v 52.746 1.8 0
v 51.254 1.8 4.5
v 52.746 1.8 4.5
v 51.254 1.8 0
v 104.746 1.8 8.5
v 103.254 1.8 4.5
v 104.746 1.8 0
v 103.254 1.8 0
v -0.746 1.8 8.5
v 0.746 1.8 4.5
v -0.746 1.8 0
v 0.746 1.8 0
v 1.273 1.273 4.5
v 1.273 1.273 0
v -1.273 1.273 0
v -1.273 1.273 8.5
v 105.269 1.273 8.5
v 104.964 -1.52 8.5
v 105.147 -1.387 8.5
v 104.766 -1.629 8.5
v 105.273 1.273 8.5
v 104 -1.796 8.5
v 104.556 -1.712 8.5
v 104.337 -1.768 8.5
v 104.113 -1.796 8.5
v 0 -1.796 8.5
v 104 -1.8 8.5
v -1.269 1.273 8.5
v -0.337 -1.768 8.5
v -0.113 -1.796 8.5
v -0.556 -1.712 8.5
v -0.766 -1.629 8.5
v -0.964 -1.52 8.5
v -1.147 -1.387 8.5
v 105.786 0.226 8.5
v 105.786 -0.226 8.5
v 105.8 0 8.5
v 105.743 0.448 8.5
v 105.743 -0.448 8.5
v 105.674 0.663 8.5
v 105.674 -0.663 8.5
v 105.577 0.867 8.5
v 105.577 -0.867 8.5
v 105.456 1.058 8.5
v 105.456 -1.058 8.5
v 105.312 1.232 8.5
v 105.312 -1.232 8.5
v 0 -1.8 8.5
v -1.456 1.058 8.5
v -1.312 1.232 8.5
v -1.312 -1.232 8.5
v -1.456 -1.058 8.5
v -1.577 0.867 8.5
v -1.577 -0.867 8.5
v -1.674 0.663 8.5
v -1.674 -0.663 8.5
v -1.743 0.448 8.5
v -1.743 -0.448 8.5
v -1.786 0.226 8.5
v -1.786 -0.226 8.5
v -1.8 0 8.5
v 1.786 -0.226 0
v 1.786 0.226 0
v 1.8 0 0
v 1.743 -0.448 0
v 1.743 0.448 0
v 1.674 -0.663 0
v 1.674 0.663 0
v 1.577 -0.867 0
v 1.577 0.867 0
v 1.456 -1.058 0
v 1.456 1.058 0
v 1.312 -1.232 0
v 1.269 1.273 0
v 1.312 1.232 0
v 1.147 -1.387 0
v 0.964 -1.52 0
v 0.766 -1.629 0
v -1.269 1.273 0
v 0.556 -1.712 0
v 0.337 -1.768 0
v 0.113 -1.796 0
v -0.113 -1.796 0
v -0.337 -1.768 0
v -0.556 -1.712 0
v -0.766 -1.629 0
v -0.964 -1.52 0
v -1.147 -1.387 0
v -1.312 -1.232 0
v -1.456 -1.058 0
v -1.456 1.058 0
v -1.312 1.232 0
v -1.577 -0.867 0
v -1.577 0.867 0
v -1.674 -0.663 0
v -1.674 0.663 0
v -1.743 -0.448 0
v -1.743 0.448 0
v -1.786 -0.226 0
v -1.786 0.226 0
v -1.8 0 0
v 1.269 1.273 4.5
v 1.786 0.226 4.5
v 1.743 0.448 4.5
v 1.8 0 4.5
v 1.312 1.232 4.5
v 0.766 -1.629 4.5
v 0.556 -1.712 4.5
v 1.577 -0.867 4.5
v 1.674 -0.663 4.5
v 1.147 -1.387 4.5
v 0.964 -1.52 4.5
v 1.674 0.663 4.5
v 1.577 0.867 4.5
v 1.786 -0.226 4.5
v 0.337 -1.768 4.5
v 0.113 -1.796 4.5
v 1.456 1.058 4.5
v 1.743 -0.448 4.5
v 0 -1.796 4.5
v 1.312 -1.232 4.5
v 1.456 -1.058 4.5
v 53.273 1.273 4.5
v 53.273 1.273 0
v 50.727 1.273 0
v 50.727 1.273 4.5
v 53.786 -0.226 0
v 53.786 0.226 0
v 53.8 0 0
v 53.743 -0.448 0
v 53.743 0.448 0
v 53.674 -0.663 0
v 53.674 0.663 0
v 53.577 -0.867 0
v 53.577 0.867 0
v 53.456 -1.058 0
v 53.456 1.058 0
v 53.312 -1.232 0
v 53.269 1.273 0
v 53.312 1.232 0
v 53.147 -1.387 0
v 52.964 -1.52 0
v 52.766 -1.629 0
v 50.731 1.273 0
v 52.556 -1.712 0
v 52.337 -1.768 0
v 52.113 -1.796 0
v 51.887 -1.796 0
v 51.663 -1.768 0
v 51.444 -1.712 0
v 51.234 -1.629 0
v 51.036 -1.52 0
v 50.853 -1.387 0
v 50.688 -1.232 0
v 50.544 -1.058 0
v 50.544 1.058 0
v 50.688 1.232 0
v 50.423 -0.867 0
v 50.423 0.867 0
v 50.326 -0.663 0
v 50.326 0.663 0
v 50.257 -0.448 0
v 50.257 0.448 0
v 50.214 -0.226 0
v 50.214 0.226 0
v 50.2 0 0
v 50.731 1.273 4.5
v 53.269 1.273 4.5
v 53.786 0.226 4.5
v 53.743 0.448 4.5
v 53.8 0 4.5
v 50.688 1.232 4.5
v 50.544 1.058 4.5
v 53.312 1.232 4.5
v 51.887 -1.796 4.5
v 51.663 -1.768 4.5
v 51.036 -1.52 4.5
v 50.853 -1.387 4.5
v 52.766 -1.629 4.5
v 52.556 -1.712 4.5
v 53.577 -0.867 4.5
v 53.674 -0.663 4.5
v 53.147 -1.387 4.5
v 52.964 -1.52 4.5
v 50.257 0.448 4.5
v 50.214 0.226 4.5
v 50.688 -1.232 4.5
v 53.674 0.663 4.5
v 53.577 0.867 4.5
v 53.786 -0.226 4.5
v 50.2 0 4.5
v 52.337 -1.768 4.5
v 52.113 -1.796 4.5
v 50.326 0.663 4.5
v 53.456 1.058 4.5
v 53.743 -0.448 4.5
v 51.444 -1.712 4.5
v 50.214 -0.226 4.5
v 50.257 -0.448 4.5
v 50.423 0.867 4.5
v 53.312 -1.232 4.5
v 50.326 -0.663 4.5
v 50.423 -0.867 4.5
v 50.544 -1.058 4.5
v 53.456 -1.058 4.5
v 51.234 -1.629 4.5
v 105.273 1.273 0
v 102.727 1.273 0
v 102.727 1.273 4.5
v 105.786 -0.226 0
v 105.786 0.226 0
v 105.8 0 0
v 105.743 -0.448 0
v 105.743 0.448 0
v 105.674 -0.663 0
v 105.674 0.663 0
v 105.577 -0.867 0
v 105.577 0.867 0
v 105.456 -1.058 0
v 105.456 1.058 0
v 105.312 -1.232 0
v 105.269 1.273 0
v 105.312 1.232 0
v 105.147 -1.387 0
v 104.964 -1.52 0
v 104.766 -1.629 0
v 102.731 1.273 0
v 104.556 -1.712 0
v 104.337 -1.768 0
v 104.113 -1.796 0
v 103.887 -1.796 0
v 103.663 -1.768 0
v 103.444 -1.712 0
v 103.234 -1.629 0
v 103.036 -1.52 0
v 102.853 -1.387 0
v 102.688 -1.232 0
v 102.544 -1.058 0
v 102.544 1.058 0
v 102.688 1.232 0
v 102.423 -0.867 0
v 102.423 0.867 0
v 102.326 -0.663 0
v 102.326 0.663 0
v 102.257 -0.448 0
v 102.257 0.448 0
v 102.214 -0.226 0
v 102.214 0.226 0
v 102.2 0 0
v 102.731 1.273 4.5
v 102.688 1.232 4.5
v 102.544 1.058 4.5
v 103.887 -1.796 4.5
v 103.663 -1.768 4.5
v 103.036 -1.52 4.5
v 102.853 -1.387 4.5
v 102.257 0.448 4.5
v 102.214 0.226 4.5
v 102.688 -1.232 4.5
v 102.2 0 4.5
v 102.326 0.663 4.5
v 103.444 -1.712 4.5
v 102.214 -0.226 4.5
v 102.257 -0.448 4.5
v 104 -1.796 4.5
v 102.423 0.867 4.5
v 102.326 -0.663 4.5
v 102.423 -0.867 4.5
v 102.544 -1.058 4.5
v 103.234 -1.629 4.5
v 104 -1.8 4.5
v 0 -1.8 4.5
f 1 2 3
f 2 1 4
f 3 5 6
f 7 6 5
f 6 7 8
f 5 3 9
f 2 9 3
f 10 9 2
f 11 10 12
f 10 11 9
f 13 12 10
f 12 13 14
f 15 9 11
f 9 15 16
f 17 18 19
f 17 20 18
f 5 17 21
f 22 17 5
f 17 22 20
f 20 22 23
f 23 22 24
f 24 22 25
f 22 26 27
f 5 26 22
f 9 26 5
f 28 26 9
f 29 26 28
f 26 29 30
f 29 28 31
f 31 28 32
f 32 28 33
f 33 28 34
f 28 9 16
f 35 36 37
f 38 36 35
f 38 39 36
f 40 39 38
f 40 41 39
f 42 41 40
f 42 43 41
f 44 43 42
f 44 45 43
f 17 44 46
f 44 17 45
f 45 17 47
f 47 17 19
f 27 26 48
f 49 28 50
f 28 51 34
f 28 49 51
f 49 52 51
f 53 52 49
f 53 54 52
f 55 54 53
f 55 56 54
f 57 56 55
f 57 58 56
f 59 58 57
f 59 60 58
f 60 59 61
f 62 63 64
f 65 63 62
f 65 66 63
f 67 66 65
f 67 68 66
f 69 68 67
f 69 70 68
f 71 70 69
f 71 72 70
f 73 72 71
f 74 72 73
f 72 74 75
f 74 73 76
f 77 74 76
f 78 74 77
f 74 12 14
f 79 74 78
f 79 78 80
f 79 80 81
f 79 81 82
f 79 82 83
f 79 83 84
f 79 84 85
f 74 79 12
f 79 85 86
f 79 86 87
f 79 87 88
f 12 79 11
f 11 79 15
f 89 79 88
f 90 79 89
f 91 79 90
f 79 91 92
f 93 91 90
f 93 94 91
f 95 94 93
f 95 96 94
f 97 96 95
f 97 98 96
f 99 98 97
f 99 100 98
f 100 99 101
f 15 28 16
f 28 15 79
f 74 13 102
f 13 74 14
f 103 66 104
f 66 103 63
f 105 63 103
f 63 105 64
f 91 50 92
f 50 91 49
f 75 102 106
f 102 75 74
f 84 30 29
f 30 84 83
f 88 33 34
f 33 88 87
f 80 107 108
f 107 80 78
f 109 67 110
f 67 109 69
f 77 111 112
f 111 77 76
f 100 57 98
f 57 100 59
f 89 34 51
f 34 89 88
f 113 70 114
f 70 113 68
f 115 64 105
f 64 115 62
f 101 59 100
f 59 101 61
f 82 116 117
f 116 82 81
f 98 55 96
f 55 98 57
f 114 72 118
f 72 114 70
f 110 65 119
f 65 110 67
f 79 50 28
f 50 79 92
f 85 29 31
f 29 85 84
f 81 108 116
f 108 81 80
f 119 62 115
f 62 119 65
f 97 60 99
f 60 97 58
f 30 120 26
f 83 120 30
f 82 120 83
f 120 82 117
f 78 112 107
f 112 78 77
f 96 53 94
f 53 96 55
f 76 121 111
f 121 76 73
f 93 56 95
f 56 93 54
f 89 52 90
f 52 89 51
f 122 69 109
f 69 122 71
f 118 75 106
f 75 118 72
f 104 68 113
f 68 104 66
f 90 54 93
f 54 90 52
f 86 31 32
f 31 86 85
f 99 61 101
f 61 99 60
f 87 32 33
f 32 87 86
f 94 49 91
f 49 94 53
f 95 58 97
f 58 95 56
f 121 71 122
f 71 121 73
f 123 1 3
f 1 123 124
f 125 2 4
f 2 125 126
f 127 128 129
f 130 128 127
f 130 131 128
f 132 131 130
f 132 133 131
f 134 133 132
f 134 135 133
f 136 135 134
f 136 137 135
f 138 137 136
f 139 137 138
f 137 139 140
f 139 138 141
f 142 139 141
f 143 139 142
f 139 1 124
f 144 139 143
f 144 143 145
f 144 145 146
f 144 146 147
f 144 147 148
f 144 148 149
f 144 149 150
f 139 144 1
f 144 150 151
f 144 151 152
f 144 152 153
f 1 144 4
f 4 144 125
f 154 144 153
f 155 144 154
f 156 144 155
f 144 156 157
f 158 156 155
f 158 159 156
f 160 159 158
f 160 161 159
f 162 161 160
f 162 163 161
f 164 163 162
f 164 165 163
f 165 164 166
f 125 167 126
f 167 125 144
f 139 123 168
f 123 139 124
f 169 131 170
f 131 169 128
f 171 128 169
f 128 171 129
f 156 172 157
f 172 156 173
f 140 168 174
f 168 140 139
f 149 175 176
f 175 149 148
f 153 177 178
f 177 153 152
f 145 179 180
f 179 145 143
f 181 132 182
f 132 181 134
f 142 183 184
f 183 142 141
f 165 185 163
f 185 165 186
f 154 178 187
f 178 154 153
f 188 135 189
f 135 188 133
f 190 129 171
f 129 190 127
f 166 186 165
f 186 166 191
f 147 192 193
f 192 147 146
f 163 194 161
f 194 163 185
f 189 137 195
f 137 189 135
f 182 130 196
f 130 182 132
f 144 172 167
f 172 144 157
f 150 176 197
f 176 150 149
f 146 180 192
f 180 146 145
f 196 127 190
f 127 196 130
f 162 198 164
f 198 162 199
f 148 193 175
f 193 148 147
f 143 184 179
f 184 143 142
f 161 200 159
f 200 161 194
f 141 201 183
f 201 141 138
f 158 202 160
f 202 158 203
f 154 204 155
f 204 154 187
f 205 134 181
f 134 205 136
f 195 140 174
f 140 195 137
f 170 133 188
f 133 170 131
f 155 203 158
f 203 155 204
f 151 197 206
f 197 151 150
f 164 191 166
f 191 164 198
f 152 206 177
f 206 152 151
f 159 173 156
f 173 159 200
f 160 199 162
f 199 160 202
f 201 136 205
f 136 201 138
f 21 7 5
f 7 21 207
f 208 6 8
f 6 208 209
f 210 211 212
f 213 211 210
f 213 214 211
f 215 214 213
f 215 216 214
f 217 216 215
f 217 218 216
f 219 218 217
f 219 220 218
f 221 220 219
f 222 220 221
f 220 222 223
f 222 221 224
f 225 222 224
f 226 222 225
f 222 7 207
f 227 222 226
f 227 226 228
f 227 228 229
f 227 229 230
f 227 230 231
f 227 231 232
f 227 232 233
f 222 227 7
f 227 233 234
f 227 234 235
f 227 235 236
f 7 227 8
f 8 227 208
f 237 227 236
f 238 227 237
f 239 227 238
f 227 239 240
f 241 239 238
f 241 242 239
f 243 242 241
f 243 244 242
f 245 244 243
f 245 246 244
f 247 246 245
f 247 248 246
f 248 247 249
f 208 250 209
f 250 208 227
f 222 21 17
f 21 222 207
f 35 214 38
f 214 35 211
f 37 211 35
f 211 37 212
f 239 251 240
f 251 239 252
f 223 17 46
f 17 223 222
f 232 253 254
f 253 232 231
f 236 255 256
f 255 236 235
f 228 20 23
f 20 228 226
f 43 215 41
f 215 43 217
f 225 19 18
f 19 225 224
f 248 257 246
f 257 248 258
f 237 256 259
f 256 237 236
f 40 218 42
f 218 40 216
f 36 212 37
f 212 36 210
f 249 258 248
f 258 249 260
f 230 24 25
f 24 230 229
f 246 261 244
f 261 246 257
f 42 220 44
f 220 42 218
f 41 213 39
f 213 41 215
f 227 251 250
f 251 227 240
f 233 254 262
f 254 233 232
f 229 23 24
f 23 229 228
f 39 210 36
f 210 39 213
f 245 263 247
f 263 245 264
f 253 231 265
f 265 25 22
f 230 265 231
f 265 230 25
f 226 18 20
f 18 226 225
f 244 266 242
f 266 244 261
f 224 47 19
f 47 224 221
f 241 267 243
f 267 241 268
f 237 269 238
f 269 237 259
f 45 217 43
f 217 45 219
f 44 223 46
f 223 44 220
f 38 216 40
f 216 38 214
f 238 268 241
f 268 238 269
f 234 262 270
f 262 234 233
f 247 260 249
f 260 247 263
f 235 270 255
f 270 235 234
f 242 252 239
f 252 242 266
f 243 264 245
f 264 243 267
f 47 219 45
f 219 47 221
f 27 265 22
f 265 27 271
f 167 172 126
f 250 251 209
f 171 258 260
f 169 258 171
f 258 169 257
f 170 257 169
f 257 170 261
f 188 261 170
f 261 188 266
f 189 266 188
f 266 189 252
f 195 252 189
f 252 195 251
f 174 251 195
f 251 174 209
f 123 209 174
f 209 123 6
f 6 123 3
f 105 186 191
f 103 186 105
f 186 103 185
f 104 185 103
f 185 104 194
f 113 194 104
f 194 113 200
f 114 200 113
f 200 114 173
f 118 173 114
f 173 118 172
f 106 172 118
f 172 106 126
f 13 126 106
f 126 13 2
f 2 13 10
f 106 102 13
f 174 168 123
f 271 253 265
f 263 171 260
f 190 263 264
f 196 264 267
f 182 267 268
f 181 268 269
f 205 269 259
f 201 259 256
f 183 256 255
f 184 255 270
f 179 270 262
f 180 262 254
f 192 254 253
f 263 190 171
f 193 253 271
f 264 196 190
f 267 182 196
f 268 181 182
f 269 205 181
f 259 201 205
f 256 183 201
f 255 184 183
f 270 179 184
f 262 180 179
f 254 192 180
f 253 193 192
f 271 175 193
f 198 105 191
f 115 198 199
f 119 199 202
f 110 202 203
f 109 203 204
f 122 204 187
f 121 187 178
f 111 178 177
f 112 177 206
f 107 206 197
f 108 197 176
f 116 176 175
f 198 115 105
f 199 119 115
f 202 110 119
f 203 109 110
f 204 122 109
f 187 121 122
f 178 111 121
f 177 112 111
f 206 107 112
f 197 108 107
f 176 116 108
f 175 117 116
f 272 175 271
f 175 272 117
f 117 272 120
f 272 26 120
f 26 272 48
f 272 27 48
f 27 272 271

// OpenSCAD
peg_diameter_mm = 3.6;
peg_spacing_mm = 52;
peg_height_mm = 4.5;
step_height_mm = 4;

for (i = [0 : 2])
{
  translate([i * peg_spacing_mm, 0, 0])
  {
    cylinder(peg_height_mm + step_height_mm, d = peg_diameter_mm, $fn = 50);
    
    intersection()
    {
      rotate([0, 0, 360 / 16])
      cylinder(peg_height_mm + step_height_mm, d = peg_diameter_mm / cos(360 / 16), $fn = 8);
      
      q = peg_diameter_mm * (0.5 - 0.5 / sqrt(2));
      translate([-0.5 * peg_diameter_mm, peg_diameter_mm * 0.5 - q, 0])
      cube([peg_diameter_mm, q, peg_height_mm * step_height_mm]);
    }
  }
}

translate([0, -0.5 * peg_diameter_mm, peg_height_mm])
cube([2 * peg_spacing_mm, peg_diameter_mm, step_height_mm]);
